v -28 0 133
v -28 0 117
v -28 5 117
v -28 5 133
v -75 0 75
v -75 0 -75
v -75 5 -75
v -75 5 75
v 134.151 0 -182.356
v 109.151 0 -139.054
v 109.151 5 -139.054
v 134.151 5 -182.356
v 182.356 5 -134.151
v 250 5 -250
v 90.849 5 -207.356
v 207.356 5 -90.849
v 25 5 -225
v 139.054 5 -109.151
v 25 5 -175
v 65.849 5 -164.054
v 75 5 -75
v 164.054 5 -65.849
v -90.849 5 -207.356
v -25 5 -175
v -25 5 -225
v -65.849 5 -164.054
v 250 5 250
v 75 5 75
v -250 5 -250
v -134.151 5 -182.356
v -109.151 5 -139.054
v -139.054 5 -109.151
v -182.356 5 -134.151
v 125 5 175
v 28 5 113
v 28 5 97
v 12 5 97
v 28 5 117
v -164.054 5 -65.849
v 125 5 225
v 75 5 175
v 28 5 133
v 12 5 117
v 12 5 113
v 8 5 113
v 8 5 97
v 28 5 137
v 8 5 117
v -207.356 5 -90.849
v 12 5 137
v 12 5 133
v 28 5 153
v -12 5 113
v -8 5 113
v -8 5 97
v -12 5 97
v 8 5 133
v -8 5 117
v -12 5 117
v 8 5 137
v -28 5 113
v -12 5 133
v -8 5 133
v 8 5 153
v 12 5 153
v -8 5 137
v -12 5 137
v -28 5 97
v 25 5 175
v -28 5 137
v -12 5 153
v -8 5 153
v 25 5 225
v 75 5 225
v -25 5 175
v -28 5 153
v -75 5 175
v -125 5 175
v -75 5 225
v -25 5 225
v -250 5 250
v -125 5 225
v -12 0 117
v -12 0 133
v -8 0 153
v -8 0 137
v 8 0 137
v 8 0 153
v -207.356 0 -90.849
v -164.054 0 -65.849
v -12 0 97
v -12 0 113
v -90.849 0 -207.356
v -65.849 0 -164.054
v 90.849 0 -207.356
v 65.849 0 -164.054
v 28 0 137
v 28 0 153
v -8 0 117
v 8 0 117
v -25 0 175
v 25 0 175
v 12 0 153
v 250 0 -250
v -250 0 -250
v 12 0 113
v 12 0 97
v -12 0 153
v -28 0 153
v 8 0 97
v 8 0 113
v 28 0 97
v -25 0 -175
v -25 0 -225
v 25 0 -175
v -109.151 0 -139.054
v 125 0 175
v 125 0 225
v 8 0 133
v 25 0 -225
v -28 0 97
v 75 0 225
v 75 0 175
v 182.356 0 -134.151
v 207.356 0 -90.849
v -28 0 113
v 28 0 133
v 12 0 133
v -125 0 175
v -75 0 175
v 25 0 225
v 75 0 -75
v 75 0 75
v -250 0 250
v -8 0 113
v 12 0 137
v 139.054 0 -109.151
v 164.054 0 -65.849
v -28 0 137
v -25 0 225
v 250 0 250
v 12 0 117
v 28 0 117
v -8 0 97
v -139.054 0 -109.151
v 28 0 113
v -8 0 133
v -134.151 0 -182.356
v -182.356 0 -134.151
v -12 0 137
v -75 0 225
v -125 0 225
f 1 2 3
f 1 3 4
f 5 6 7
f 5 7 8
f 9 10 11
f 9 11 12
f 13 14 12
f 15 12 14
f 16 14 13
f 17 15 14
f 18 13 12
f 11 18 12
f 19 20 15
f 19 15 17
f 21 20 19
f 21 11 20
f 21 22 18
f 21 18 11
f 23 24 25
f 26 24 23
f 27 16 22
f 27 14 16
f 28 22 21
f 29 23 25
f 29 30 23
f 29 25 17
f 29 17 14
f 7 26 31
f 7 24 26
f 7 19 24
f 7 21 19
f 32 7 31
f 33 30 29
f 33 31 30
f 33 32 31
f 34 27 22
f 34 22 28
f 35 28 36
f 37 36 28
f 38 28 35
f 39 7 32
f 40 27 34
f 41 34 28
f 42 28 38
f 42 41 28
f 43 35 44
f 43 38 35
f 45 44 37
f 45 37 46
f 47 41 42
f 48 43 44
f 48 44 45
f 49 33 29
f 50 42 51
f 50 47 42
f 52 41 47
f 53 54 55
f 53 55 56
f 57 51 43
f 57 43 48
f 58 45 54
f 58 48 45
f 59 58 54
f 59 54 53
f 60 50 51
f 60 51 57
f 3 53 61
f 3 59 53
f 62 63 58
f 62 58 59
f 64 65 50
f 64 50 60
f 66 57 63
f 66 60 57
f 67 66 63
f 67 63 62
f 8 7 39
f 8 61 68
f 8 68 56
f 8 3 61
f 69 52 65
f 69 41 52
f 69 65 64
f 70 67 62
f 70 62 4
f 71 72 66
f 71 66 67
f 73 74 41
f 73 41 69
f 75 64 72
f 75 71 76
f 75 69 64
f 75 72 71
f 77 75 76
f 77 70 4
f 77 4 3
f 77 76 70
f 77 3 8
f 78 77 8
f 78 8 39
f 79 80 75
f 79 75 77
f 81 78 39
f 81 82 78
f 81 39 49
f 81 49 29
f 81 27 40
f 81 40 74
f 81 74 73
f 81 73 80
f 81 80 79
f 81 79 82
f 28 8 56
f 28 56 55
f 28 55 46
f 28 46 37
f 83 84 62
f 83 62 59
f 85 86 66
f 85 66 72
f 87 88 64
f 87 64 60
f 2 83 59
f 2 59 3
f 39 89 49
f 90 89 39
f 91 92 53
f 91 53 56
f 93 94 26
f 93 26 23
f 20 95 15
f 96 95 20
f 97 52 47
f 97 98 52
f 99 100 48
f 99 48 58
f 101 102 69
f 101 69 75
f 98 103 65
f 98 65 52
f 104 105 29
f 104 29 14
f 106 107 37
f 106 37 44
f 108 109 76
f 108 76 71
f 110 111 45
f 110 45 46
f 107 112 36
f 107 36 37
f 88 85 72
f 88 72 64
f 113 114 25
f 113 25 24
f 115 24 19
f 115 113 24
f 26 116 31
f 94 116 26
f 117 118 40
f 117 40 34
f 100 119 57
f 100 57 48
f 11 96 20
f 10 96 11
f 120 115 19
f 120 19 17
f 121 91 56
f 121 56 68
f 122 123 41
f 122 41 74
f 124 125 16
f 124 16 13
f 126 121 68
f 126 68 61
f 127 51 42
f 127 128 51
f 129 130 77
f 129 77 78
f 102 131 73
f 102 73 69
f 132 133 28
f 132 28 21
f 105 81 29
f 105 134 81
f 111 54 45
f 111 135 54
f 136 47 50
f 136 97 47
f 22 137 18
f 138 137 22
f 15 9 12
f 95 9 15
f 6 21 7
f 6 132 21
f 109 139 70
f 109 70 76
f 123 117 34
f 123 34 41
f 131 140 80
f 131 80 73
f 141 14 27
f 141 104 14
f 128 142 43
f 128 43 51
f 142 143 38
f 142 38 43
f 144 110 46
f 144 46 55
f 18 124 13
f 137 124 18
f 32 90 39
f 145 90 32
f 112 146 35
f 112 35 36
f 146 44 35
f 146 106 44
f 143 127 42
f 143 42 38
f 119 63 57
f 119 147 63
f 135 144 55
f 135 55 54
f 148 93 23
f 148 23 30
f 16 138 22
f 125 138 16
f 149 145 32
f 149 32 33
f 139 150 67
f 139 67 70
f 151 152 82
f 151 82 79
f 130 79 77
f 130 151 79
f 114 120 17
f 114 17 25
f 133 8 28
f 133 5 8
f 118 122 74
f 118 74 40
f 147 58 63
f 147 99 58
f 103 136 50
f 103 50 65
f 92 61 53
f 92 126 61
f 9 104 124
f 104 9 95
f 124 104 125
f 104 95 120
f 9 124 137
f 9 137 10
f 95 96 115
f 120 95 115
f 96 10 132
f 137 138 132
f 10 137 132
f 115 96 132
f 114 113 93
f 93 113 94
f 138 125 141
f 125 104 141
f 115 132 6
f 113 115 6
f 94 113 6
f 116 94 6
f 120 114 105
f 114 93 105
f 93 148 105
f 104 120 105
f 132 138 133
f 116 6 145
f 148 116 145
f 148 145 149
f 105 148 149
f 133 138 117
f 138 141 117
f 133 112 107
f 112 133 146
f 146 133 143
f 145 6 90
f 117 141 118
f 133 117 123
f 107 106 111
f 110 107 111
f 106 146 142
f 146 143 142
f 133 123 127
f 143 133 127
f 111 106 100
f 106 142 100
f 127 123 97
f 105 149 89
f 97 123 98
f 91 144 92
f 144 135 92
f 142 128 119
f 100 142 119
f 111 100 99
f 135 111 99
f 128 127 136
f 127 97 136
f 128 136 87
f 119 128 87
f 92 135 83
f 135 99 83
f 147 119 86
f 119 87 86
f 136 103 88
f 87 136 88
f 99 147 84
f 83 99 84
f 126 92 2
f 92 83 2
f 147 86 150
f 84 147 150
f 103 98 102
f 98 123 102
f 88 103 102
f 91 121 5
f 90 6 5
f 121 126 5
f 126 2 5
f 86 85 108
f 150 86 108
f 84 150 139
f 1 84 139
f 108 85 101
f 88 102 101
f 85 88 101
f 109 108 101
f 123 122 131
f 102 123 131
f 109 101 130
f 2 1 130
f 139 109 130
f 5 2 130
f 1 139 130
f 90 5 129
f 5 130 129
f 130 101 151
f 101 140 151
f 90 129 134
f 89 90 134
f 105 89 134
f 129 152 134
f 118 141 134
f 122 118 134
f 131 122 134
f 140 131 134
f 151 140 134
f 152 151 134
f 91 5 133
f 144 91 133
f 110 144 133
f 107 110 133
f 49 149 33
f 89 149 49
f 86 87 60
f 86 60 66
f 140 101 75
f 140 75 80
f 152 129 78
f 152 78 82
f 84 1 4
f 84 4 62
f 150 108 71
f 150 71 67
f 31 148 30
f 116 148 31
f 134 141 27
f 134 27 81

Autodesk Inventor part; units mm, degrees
ref_plane "YZ Plane" through (0, 0, 0) normal (1, 0, 0) x (0, 1, 0)
ref_plane "XZ Plane" through (0, 0, 0) normal (0, 1, 0) x (-1, 0, 0)
ref_plane "XY Plane" through (0, 0, 0) normal (0, 0, 1) x (1, 0, 0)
sketch "Эскиз1" plane through (0, 0, 0) normal (0, 1, 0) x (-1, 0, 0)
  line L0 (28, 97) -> (28, 113)
  line L1 (28, 113) -> (12, 113)
  line L2 (12, 113) -> (12, 97)
  line L3 (12, 97) -> (28, 97)
  line L4 (8, 97) -> (8, 113)
  line L5 (8, 113) -> (-8, 113)
  line L6 (-8, 113) -> (-8, 97)
  line L7 (-8, 97) -> (8, 97)
  line L8 (-12, 97) -> (-12, 113)
  line L9 (-12, 113) -> (-28, 113)
  line L10 (-28, 113) -> (-28, 97)
  line L11 (-28, 97) -> (-12, 97)
  line L12 (-12, 117) -> (-12, 133)
  line L13 (-12, 133) -> (-28, 133)
  line L14 (-28, 133) -> (-28, 117)
  line L15 (-28, 117) -> (-12, 117)
  line L16 (8, 133) -> (-8, 133)
  line L17 (-8, 133) -> (-8, 117)
  line L18 (-8, 117) -> (8, 117)
  line L19 (8, 117) -> (8, 133)
  line L20 (28, 117) -> (28, 133)
  line L21 (28, 133) -> (12, 133)
  line L22 (12, 133) -> (12, 117)
  line L23 (12, 117) -> (28, 117)
  line L24 (28, 137) -> (28, 153)
  line L25 (28, 153) -> (12, 153)
  line L26 (12, 153) -> (12, 137)
  line L27 (12, 137) -> (28, 137)
  line L28 (8, 137) -> (8, 153)
  line L29 (8, 153) -> (-8, 153)
  line L30 (-8, 153) -> (-8, 137)
  line L31 (-8, 137) -> (8, 137)
  line L32 (-12, 137) -> (-12, 153)
  line L33 (-12, 153) -> (-28, 153)
  line L34 (-28, 153) -> (-28, 137)
  line L35 (-28, 137) -> (-12, 137)
  line L36 (-75, 225) -> (-125, 225)
  line L37 (-125, 225) -> (-125, 175)
  line L38 (-125, 175) -> (-75, 175)
  line L39 (-75, 175) -> (-75, 225)
  line L40 (25, 225) -> (-25, 225)
  line L41 (-25, 225) -> (-25, 175)
  line L42 (-25, 175) -> (25, 175)
  line L43 (25, 175) -> (25, 225)
  line L44 (125, 225) -> (75, 225)
  line L45 (75, 225) -> (75, 175)
  line L46 (75, 175) -> (125, 175)
  line L47 (125, 175) -> (125, 225)
  line L48 (75, 75) -> (-75, 75)
  line L49 (-75, 75) -> (-75, -75)
  line L50 (-75, -75) -> (75, -75)
  line L51 (75, -75) -> (75, 75)
  line L52 (-139.0544, -109.1506) -> (-164.0544, -65.8494)
  line L53 (-164.0544, -65.8494) -> (-207.3557, -90.8494)
  line L54 (-207.3557, -90.8494) -> (-182.3557, -134.1506)
  line L55 (-182.3557, -134.1506) -> (-139.0544, -109.1506)
  line L56 (-65.8494, -164.0544) -> (-109.1506, -139.0544)
  line L57 (-109.1506, -139.0544) -> (-134.1506, -182.3557)
  line L58 (-134.1506, -182.3557) -> (-90.8494, -207.3557)
  line L59 (-90.8494, -207.3557) -> (-65.8494, -164.0544)
  line L60 (25, -175) -> (-25, -175)
  line L61 (-25, -175) -> (-25, -225)
  line L62 (-25, -225) -> (25, -225)
  line L63 (25, -225) -> (25, -175)
  line L64 (109.1506, -139.0544) -> (65.8494, -164.0544)
  line L65 (65.8494, -164.0544) -> (90.8494, -207.3557)
  line L66 (90.8494, -207.3557) -> (134.1506, -182.3557)
  line L67 (134.1506, -182.3557) -> (109.1506, -139.0544)
  line L68 (164.0544, -65.8494) -> (139.0544, -109.1506)
  line L69 (139.0544, -109.1506) -> (182.3557, -134.1506)
  line L70 (182.3557, -134.1506) -> (207.3557, -90.8494)
  line L71 (207.3557, -90.8494) -> (164.0544, -65.8494)
  line L72 (-250, -250) -> (-250, 250)
  line L73 (-250, 250) -> (250, 250)
  line L74 (250, 250) -> (250, -250)
  line L75 (250, -250) -> (-250, -250)
  line L76 (-75, 225) -> (-125, 225)
  line L77 (-125, 225) -> (-125, 175)
  line L78 (-125, 175) -> (-75, 175)
  line L79 (-75, 175) -> (-75, 225)
  line L80 (28, 153) -> (12, 153)
  line L81 (12, 153) -> (12, 137)
  line L82 (12, 137) -> (28, 137)
  line L83 (28, 137) -> (28, 153)
  line L84 (28, 133) -> (12, 133)
  line L85 (12, 133) -> (12, 117)
  line L86 (12, 117) -> (28, 117)
  line L87 (28, 117) -> (28, 133)
  line L88 (28, 113) -> (12, 113)
  line L89 (12, 113) -> (12, 97)
  line L90 (12, 97) -> (28, 97)
  line L91 (28, 97) -> (28, 113)
  line L92 (8, 113) -> (-8, 113)
  line L93 (-8, 113) -> (-8, 97)
  line L94 (-8, 97) -> (8, 97)
  line L95 (8, 97) -> (8, 113)
  line L96 (-12, 97) -> (-28, 97)
  line L97 (-28, 97) -> (-28, 113)
  line L98 (-28, 113) -> (-12, 113)
  line L99 (-12, 113) -> (-12, 97)
  line L100 (-12, 117) -> (-28, 117)
  line L101 (-28, 117) -> (-28, 133)
  line L102 (-28, 133) -> (-12, 133)
  line L103 (-12, 133) -> (-12, 117)
  line L104 (-12, 137) -> (-28, 137)
  line L105 (-28, 137) -> (-28, 153)
  line L106 (-28, 153) -> (-12, 153)
  line L107 (-12, 153) -> (-12, 137)
  line L108 (8, 153) -> (-8, 153)
  line L109 (-8, 153) -> (-8, 137)
  line L110 (-8, 137) -> (8, 137)
  line L111 (8, 137) -> (8, 153)
  line L112 (8, 133) -> (-8, 133)
  line L113 (-8, 133) -> (-8, 117)
  line L114 (-8, 117) -> (8, 117)
  line L115 (8, 117) -> (8, 133)
  line L116 (75, 75) -> (-75, 75)
  line L117 (-75, 75) -> (-75, -75)
  line L118 (-75, -75) -> (75, -75)
  line L119 (75, -75) -> (75, 75)
  point P0 (0, 0)
extrude "Выдавливание1" add sketch "Эскиз1" along normal blind 5
properties part number "КВ33.045.001 - Основание" material "Дерево (береза)"
